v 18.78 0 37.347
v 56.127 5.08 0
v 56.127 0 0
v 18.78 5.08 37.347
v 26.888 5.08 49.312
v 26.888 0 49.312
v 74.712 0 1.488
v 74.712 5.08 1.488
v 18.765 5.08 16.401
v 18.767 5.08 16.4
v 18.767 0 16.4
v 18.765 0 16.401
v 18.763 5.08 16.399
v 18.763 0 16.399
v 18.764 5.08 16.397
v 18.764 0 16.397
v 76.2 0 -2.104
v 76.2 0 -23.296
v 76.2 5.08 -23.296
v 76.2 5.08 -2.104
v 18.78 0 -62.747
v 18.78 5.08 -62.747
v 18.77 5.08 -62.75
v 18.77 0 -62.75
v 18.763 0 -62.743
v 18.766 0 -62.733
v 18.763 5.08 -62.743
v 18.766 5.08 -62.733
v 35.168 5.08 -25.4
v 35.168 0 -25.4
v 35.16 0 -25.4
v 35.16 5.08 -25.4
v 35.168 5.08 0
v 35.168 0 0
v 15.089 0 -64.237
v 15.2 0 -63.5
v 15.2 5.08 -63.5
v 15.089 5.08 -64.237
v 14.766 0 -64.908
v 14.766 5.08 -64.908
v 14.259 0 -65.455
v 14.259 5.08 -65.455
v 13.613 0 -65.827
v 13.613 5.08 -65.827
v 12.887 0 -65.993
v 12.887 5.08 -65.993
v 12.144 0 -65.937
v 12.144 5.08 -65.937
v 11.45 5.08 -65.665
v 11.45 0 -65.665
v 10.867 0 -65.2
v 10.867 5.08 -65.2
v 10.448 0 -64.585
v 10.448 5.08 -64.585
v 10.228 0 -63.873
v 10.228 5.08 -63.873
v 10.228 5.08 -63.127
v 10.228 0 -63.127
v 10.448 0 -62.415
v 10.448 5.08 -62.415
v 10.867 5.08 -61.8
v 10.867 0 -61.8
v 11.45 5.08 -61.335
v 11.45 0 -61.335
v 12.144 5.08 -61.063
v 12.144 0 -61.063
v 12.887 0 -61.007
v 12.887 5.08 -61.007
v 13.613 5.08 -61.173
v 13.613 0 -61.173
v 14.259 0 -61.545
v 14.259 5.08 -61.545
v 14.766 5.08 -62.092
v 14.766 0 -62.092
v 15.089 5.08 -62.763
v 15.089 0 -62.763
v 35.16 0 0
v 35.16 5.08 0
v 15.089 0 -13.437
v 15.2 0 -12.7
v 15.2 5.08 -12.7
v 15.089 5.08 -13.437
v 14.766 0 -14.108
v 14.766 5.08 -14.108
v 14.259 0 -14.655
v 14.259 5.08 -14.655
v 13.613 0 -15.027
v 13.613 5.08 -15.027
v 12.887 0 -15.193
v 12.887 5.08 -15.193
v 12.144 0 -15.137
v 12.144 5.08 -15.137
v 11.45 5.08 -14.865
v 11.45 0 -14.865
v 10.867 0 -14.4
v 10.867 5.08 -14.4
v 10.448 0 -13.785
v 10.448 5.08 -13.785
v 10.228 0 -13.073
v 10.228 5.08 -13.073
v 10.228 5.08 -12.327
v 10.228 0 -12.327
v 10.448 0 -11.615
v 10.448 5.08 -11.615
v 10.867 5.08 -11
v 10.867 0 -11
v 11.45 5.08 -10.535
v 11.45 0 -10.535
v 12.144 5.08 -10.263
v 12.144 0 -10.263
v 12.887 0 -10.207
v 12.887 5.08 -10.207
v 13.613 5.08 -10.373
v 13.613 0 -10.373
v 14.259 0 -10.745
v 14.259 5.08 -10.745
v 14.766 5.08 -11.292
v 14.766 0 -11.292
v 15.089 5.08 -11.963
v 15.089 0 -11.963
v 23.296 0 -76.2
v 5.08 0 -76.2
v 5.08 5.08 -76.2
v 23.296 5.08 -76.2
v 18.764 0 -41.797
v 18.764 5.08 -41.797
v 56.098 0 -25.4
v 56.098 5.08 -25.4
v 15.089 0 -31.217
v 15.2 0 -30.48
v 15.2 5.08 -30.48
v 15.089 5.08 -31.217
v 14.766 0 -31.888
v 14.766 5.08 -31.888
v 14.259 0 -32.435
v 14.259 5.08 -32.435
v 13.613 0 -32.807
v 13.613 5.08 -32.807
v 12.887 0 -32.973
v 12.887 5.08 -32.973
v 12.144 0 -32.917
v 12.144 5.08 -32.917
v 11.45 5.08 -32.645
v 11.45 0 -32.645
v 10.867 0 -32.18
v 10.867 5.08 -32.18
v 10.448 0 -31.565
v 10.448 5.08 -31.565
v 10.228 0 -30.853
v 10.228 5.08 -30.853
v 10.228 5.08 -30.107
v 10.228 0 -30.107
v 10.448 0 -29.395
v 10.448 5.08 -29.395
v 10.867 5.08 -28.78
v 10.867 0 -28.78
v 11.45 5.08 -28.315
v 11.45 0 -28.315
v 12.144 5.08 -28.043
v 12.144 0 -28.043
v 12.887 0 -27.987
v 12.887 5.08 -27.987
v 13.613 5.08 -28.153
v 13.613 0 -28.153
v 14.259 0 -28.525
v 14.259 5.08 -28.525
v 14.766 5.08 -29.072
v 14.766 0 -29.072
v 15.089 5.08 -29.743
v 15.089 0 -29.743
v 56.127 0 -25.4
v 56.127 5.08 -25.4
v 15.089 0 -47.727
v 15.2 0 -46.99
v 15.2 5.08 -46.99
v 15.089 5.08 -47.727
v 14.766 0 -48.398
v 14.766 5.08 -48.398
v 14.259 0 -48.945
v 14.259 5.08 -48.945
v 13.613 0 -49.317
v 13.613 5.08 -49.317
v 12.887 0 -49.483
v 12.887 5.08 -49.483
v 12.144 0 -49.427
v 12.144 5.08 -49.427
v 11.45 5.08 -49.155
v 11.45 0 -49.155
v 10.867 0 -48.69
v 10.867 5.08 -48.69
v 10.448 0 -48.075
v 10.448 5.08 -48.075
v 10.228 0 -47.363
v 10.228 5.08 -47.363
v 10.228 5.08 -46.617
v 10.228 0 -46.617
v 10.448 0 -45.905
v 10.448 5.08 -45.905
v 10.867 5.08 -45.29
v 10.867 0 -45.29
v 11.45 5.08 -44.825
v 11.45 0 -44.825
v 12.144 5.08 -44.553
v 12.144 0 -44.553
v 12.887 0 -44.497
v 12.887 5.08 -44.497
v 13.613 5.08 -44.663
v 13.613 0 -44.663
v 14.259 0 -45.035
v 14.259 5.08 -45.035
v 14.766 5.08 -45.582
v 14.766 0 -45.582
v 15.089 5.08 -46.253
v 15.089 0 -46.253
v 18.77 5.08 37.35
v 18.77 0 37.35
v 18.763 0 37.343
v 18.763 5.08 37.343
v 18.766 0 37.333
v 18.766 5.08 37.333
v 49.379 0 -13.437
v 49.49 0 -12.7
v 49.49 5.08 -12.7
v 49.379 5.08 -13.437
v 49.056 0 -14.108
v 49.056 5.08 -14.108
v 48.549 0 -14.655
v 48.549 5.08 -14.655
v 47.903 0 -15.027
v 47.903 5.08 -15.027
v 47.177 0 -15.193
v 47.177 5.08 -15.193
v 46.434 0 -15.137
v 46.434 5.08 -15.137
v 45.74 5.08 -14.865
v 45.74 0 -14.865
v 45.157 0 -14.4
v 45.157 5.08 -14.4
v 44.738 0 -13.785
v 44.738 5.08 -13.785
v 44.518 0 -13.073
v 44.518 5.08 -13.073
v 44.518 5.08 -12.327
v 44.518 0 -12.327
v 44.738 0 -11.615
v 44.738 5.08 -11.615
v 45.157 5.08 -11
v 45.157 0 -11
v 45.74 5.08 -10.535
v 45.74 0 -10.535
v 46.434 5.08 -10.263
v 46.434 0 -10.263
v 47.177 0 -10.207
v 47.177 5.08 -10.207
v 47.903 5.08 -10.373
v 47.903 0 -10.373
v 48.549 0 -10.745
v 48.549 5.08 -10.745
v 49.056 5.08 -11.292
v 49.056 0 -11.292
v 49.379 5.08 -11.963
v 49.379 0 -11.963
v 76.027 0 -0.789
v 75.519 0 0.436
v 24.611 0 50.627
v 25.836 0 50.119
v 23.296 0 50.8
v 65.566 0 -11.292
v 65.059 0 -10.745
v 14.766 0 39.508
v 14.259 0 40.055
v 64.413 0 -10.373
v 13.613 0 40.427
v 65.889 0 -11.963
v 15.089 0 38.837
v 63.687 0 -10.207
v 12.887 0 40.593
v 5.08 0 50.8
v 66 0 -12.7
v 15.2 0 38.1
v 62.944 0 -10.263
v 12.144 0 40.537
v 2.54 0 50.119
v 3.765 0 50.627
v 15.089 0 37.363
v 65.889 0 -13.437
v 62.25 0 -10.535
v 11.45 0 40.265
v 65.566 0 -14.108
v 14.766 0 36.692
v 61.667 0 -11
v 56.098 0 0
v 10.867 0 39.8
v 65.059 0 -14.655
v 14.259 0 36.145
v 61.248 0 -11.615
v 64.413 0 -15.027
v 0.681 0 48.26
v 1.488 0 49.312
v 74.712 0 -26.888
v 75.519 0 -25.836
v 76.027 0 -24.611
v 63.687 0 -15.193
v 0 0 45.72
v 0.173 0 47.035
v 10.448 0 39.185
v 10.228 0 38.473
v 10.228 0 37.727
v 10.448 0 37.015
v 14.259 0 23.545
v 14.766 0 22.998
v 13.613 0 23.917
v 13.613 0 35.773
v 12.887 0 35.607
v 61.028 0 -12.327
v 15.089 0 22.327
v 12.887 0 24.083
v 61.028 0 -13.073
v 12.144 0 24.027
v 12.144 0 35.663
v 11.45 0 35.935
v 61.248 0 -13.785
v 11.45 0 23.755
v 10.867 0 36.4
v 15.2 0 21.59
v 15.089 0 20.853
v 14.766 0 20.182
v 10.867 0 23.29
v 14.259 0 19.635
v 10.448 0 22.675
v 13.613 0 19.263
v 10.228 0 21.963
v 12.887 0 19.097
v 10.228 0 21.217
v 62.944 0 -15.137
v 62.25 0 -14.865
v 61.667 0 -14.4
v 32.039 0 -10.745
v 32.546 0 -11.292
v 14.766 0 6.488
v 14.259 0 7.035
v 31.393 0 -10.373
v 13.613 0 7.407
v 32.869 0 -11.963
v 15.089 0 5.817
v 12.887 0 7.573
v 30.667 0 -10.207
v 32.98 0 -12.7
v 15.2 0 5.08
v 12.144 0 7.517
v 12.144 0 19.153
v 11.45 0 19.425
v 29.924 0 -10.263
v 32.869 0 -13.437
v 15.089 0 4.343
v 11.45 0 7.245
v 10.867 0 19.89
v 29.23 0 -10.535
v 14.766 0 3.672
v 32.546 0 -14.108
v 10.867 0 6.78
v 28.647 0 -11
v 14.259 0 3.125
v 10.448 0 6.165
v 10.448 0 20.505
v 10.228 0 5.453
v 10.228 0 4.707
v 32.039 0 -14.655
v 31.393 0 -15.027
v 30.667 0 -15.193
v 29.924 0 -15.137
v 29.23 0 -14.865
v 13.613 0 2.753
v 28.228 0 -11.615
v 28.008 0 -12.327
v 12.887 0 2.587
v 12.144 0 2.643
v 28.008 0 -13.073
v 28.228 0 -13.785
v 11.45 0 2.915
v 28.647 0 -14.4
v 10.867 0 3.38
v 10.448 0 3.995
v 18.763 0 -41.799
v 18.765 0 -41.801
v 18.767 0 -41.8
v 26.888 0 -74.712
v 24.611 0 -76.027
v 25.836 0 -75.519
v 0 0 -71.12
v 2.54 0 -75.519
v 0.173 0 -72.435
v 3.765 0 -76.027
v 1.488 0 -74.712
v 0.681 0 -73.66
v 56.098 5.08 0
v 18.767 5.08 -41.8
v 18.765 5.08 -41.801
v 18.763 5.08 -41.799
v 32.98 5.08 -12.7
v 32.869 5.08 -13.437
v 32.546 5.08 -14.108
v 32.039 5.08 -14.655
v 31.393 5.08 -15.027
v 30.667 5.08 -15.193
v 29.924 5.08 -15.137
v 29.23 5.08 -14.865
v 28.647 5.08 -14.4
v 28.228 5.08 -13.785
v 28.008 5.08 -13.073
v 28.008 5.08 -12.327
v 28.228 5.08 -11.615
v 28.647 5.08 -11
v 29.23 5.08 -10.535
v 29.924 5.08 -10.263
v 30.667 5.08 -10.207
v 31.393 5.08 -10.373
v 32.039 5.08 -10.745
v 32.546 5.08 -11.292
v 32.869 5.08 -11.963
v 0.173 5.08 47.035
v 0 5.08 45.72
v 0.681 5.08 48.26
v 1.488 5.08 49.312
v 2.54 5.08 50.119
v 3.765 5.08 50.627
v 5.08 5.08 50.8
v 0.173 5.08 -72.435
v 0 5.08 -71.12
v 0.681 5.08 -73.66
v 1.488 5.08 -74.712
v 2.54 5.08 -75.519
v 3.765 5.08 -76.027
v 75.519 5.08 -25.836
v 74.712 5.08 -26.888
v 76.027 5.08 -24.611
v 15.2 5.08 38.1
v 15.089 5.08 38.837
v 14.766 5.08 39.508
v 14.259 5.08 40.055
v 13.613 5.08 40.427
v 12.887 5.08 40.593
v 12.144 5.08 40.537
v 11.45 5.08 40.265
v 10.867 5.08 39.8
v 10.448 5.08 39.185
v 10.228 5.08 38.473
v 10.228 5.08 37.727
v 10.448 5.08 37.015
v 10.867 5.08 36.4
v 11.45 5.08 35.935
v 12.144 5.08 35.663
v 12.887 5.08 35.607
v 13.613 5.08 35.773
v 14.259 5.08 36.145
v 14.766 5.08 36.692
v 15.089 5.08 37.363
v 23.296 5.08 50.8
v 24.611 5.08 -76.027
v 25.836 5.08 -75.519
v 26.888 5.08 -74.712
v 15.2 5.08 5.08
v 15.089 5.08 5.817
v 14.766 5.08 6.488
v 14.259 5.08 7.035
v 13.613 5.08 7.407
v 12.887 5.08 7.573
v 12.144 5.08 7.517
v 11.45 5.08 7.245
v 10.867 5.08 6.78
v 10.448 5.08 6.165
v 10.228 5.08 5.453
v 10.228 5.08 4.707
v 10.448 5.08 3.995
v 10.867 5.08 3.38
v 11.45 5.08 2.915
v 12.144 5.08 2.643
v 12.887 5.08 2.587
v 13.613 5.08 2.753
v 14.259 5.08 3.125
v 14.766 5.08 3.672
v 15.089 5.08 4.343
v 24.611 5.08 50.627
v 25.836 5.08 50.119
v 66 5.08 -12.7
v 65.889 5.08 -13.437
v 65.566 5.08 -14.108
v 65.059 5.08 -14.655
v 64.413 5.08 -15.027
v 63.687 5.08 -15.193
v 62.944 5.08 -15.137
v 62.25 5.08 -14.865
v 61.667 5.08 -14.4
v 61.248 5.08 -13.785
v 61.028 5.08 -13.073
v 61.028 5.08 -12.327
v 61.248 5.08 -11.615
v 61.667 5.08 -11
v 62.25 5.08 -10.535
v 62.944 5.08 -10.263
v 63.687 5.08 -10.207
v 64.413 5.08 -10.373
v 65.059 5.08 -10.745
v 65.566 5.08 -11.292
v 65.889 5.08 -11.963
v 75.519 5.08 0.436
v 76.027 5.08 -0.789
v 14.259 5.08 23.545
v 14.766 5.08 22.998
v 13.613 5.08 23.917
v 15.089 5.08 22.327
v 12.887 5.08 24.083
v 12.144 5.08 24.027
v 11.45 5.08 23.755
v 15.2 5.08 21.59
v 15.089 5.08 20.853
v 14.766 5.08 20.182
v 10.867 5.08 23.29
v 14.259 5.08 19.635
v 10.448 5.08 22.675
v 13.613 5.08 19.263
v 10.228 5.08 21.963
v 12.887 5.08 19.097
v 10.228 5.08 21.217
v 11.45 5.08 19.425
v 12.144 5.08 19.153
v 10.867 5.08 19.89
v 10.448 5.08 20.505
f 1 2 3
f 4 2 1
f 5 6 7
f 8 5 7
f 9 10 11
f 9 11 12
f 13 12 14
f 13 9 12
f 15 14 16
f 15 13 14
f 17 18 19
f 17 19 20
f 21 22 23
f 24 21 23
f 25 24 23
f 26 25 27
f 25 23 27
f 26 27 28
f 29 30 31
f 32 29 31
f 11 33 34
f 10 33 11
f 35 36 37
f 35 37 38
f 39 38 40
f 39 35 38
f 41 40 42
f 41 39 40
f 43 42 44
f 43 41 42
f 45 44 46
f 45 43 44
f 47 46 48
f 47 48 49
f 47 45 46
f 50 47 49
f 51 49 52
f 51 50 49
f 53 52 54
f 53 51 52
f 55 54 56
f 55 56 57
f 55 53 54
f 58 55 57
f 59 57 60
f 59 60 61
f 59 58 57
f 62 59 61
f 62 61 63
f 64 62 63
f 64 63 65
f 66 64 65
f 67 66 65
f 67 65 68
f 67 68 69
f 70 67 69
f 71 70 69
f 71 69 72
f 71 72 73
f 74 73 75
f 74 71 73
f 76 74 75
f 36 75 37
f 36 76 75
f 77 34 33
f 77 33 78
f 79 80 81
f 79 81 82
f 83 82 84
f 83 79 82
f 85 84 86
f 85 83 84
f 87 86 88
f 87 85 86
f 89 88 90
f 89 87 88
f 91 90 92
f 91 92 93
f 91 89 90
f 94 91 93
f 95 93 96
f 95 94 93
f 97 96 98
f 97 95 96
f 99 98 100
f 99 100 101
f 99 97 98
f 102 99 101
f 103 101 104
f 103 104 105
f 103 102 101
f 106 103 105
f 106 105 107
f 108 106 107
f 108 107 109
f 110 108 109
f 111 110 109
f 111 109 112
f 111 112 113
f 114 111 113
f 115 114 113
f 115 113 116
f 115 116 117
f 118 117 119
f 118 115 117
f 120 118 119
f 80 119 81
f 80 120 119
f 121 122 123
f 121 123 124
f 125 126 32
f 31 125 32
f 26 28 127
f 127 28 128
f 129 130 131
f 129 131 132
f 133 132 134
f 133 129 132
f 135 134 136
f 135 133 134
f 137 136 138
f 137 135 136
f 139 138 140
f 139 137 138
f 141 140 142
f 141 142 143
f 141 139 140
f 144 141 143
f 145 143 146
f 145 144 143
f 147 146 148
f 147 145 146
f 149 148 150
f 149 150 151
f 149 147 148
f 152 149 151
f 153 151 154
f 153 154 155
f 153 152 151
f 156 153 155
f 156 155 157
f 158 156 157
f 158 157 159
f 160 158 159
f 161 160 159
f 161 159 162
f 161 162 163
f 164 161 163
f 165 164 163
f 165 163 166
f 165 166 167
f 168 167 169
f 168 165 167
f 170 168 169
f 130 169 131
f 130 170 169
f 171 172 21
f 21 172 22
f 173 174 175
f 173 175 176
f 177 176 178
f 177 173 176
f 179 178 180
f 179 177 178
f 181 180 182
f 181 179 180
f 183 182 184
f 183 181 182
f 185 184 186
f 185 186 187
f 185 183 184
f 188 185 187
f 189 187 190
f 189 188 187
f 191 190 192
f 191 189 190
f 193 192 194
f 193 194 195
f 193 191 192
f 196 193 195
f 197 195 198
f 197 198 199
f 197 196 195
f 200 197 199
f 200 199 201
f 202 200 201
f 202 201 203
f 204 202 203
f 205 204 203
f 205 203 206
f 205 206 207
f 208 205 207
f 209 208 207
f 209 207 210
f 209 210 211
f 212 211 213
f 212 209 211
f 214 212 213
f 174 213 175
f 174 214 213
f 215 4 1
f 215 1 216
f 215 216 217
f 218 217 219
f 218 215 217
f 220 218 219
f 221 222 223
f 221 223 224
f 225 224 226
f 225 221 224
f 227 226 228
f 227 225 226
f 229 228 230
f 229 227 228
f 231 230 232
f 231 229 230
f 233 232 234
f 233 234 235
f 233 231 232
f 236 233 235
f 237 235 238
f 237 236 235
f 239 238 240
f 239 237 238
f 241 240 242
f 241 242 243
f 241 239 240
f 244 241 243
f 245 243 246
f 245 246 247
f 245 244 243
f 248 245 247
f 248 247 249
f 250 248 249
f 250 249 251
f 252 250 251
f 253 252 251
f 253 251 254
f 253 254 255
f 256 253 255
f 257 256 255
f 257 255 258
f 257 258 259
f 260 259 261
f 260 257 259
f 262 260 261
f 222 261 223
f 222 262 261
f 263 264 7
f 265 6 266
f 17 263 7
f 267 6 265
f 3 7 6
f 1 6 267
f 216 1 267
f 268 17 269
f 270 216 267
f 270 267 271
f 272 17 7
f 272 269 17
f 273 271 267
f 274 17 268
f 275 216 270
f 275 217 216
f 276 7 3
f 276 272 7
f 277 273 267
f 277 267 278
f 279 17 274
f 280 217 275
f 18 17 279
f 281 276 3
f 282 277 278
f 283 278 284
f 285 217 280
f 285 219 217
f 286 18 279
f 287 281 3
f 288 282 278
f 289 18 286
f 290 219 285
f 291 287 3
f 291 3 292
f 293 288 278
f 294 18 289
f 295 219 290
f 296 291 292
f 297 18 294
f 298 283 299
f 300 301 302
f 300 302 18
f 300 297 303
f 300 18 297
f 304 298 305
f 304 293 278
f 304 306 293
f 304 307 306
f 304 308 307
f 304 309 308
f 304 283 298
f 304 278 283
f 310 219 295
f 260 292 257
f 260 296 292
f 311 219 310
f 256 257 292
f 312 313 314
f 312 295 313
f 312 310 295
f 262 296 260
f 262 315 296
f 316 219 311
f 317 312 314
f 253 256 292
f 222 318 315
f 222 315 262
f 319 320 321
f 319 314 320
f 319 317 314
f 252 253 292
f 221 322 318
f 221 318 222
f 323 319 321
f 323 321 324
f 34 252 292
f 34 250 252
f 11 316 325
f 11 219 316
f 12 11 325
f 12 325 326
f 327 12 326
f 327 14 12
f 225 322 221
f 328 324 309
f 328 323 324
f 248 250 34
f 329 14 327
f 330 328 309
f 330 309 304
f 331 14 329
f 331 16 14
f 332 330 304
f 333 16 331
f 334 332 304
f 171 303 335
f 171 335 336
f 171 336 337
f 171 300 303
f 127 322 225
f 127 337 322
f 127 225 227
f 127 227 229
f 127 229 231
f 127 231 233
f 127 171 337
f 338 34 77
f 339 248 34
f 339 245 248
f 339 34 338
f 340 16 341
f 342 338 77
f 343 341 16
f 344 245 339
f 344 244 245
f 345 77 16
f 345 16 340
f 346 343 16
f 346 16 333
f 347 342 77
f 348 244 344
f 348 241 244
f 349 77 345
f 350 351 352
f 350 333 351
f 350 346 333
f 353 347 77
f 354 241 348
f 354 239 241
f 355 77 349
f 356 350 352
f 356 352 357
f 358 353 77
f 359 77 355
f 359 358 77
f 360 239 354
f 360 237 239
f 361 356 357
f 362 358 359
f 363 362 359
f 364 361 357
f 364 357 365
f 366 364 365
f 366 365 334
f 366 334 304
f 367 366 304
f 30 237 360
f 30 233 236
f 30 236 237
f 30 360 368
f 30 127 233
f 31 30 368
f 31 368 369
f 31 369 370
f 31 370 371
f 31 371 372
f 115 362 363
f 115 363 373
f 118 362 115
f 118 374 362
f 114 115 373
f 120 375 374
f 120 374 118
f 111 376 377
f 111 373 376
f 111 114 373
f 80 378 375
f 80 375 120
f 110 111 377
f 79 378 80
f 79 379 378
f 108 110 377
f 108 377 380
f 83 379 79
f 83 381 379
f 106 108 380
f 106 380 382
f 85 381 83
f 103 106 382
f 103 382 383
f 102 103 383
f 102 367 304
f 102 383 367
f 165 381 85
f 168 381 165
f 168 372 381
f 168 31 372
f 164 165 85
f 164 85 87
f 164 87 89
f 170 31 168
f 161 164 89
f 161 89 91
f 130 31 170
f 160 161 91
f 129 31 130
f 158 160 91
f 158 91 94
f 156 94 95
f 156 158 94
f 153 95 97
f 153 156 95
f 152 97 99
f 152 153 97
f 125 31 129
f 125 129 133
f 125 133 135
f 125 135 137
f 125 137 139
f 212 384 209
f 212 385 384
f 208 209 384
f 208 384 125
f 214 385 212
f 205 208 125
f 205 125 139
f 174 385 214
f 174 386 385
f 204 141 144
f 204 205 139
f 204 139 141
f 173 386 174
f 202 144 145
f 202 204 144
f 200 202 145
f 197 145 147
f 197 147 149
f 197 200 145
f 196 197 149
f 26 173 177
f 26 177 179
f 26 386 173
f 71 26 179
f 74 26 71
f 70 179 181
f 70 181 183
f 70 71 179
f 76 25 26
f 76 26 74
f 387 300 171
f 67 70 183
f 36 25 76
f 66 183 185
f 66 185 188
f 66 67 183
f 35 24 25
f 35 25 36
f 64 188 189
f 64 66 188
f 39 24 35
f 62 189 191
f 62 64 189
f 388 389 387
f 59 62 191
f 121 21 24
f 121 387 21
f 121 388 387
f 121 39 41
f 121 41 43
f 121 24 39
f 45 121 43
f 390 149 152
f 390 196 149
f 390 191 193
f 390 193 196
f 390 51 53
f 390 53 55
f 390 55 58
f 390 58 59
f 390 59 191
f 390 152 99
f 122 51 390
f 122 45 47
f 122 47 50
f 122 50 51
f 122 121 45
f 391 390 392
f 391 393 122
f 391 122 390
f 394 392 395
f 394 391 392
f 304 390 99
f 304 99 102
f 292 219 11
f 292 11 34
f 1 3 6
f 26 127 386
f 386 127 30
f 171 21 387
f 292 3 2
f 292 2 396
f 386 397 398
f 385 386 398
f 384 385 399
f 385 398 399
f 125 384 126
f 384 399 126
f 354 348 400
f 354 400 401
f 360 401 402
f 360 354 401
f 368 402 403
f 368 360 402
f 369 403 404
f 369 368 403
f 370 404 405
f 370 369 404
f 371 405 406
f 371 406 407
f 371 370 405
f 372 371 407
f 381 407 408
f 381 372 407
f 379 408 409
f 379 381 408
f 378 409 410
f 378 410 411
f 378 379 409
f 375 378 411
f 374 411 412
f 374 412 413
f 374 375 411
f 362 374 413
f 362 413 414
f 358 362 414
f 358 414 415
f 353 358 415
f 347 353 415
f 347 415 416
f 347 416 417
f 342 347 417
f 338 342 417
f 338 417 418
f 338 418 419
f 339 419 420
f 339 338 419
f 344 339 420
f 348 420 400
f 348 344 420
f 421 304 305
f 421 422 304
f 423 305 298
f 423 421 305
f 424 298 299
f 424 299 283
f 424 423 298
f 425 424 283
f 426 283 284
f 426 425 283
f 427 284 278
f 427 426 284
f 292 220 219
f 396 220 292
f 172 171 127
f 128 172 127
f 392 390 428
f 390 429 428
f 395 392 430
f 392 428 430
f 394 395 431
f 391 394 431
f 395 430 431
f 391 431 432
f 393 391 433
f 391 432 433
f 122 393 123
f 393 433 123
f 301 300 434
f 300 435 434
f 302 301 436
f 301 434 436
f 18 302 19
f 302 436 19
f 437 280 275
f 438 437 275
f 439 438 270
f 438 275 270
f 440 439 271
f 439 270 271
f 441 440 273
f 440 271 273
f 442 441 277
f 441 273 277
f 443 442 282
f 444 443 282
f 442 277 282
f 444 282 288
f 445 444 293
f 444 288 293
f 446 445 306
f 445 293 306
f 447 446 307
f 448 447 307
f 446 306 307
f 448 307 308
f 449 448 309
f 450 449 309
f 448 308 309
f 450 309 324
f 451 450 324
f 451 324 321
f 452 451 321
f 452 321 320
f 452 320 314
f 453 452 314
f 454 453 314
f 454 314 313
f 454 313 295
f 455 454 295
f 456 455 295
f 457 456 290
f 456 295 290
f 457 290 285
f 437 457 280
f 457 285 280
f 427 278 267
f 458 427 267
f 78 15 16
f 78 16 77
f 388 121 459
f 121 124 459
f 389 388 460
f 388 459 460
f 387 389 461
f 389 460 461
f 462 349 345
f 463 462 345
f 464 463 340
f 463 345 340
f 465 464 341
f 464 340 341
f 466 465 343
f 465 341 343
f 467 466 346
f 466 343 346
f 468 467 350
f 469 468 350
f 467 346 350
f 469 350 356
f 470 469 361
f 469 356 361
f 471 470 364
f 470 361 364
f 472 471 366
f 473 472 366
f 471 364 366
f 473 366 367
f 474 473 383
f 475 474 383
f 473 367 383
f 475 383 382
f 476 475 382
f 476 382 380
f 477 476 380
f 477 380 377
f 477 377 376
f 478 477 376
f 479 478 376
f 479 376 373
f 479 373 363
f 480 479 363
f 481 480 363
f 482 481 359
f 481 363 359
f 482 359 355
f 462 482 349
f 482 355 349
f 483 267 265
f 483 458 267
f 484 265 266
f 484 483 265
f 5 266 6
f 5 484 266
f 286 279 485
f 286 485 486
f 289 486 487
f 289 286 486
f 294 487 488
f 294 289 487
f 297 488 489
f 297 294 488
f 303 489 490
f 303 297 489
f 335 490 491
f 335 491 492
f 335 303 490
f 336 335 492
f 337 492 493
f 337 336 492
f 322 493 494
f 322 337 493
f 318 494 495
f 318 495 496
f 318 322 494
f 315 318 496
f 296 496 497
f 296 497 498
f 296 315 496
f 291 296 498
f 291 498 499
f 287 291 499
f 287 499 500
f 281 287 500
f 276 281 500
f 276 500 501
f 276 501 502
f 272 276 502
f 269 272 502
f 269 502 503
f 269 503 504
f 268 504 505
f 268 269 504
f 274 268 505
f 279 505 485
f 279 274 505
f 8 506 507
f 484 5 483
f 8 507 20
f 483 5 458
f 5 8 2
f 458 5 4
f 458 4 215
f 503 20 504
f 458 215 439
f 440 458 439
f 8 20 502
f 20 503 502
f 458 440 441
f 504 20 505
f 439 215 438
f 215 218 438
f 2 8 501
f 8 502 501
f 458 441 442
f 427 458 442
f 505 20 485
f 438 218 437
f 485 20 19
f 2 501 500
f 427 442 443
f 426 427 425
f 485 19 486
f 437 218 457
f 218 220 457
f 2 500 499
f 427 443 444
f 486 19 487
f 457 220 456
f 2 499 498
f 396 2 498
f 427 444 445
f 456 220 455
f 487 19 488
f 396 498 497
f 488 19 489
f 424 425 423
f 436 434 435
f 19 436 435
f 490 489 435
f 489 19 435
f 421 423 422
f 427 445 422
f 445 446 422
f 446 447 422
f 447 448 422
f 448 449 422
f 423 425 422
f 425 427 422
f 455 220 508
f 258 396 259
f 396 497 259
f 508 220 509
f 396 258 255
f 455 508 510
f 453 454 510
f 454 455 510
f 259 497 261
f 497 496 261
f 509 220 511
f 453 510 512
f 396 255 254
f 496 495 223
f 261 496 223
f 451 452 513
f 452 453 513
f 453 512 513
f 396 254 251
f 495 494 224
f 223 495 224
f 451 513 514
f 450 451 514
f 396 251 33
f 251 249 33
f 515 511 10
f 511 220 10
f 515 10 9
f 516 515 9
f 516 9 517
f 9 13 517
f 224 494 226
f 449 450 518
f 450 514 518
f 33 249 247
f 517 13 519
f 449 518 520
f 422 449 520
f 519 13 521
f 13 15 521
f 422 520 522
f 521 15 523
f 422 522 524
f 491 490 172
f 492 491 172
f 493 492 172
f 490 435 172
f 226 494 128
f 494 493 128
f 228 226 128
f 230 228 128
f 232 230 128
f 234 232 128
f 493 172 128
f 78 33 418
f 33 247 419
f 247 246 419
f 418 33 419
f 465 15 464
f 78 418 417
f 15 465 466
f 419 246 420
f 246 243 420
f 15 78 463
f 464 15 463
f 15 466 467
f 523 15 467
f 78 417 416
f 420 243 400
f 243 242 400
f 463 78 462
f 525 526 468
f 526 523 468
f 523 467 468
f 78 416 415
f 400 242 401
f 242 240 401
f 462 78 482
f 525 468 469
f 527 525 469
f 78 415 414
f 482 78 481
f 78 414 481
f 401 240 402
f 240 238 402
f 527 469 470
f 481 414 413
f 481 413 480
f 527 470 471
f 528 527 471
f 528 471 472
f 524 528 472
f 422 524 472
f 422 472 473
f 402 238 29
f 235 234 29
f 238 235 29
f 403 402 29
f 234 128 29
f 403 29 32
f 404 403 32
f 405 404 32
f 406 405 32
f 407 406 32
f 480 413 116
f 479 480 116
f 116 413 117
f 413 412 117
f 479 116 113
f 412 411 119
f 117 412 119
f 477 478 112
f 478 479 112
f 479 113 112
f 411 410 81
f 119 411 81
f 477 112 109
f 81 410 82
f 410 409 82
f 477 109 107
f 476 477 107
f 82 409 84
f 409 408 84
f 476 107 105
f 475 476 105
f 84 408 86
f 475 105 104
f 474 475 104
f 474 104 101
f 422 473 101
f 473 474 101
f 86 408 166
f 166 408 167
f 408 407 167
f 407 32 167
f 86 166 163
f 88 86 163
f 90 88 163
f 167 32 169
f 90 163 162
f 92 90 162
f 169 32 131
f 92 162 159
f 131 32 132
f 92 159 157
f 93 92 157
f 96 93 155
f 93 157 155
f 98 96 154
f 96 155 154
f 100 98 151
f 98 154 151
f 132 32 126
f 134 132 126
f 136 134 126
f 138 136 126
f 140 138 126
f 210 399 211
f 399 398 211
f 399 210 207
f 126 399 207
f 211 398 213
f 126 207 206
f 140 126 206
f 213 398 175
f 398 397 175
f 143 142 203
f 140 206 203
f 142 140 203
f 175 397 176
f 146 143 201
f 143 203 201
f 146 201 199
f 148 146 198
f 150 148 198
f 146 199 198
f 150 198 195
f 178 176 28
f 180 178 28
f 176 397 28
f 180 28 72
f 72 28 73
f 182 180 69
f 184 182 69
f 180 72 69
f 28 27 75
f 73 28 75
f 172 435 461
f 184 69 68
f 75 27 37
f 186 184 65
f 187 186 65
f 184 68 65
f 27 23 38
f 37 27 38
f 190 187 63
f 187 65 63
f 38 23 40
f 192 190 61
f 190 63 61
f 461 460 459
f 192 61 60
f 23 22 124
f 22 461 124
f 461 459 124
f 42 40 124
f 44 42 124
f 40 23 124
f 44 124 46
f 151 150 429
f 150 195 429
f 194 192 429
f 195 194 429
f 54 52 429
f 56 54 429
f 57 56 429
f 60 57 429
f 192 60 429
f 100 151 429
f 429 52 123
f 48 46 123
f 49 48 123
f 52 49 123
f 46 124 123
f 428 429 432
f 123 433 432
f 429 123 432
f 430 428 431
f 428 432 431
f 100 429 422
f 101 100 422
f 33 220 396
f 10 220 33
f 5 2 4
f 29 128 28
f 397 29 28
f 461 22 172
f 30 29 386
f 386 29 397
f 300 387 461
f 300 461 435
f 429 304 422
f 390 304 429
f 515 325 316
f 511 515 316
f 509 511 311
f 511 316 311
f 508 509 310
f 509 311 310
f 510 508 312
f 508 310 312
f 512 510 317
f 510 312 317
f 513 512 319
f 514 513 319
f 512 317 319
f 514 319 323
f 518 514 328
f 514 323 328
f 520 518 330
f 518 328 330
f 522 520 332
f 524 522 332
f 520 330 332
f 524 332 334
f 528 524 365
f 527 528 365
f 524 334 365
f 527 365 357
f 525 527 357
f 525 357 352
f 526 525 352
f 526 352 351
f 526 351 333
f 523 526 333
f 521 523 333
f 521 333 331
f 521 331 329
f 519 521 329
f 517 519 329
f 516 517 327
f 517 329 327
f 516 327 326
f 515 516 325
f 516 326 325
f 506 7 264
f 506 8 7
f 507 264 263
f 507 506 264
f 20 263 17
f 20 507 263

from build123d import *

# Parameters (mm, degrees)
SKETCH1_R           = 2.5
BOSS_EXTRUDE1_DEPTH = 5.08
FILLET1_R           = 5.08
FILLET2_R           = 5.08
CUT_EXTRUDE1_DEPTH  = 6.08


with BuildPart() as part:
    # Sketch1 → Boss-Extrude1 (new body)
    with BuildSketch(Plane(origin=(0, 0, 0), x_dir=(1, 0, 0), z_dir=(0, 1, 0))):
        Polygon((0, 0), (0, 76.2), (25.4, 76.2), (76.2, 25.4), (76.2, 0), align=None)
        with Locations((12.7, 63.5)):
            Circle(SKETCH1_R, mode=Mode.SUBTRACT)
        with Locations((63.5, 12.7)):
            Circle(SKETCH1_R, mode=Mode.SUBTRACT)
        with Locations((12.7, 46.99)):
            Circle(SKETCH1_R, mode=Mode.SUBTRACT)
        with Locations((12.7, 30.48)):
            Circle(SKETCH1_R, mode=Mode.SUBTRACT)
        with Locations((46.99, 12.7)):
            Circle(SKETCH1_R, mode=Mode.SUBTRACT)
        with Locations((30.48, 12.7)):
            Circle(SKETCH1_R, mode=Mode.SUBTRACT)
        with Locations((12.7, 12.7)):
            Circle(SKETCH1_R, mode=Mode.SUBTRACT)
    extrude(amount=BOSS_EXTRUDE1_DEPTH)

    # Fillet1
    fillet1_edges = [part.edges().sort_by_distance(p)[0] for p in [
        (0, 2.54, 0),
    ]]
    fillet(fillet1_edges, radius=FILLET1_R)

    # Fillet2
    fillet2_edges = [part.edges().sort_by_distance(p)[0] for p in [
        (0, 2.54, -76.2),
        (25.4, 2.54, -76.2),
        (76.2, 2.54, -25.4),
        (76.2, 2.54, 0),
    ]]
    fillet(fillet2_edges, radius=FILLET2_R)

    # Sketch2 → Cut-Extrude1 (cut, through all)
    with BuildSketch(Plane(origin=(0, 5.08, 0), x_dir=(1, 0, 0), z_dir=(0, 1, 0))):
        with BuildLine():
            Line((18.765620134, 62.732842611), (62.732842611, 18.765620134))
            ThreePointArc((62.732842611, 18.765620134), (62.746984747, 18.765620134), (62.746984747, 18.77976227))
            Line((62.746984747, 18.77976227), (18.77976227, 62.746984747))
            ThreePointArc((18.77976227, 62.746984747), (18.765620134, 62.746984747), (18.765620134, 62.732842611))
        make_face()
        with BuildLine():
            Line((18.763824083, 41.796641641), (41.796641641, 18.763824083))
            ThreePointArc((41.796641641, 18.763824083), (41.800233744, 18.763824083), (41.800233744, 18.767416186))
            Line((41.800233744, 18.767416186), (18.767416186, 41.800233744))
            ThreePointArc((18.767416186, 41.800233744), (18.763824083, 41.800233744), (18.763824083, 41.796641641))
        make_face()
        with BuildLine():
            Line((24.444358625, 18.548492515), (18.548492515, 24.444358625))
            ThreePointArc((18.548492515, 24.444358625), (18.544900412, 24.444358625), (18.544900412, 24.440766523))
            Line((18.544900412, 24.440766523), (24.440766523, 18.544900412))
            ThreePointArc((24.440766523, 18.544900412), (24.444358625, 18.544900412), (24.444358625, 18.548492515))
        make_face()
    extrude(amount=-CUT_EXTRUDE1_DEPTH, mode=Mode.SUBTRACT)

    # Mirror1: part across plane


with BuildPart() as part_1:
    add(part.part)
    add(part.part.mirror(Plane.XY.offset(-12.7)))


solid = part_1.part
